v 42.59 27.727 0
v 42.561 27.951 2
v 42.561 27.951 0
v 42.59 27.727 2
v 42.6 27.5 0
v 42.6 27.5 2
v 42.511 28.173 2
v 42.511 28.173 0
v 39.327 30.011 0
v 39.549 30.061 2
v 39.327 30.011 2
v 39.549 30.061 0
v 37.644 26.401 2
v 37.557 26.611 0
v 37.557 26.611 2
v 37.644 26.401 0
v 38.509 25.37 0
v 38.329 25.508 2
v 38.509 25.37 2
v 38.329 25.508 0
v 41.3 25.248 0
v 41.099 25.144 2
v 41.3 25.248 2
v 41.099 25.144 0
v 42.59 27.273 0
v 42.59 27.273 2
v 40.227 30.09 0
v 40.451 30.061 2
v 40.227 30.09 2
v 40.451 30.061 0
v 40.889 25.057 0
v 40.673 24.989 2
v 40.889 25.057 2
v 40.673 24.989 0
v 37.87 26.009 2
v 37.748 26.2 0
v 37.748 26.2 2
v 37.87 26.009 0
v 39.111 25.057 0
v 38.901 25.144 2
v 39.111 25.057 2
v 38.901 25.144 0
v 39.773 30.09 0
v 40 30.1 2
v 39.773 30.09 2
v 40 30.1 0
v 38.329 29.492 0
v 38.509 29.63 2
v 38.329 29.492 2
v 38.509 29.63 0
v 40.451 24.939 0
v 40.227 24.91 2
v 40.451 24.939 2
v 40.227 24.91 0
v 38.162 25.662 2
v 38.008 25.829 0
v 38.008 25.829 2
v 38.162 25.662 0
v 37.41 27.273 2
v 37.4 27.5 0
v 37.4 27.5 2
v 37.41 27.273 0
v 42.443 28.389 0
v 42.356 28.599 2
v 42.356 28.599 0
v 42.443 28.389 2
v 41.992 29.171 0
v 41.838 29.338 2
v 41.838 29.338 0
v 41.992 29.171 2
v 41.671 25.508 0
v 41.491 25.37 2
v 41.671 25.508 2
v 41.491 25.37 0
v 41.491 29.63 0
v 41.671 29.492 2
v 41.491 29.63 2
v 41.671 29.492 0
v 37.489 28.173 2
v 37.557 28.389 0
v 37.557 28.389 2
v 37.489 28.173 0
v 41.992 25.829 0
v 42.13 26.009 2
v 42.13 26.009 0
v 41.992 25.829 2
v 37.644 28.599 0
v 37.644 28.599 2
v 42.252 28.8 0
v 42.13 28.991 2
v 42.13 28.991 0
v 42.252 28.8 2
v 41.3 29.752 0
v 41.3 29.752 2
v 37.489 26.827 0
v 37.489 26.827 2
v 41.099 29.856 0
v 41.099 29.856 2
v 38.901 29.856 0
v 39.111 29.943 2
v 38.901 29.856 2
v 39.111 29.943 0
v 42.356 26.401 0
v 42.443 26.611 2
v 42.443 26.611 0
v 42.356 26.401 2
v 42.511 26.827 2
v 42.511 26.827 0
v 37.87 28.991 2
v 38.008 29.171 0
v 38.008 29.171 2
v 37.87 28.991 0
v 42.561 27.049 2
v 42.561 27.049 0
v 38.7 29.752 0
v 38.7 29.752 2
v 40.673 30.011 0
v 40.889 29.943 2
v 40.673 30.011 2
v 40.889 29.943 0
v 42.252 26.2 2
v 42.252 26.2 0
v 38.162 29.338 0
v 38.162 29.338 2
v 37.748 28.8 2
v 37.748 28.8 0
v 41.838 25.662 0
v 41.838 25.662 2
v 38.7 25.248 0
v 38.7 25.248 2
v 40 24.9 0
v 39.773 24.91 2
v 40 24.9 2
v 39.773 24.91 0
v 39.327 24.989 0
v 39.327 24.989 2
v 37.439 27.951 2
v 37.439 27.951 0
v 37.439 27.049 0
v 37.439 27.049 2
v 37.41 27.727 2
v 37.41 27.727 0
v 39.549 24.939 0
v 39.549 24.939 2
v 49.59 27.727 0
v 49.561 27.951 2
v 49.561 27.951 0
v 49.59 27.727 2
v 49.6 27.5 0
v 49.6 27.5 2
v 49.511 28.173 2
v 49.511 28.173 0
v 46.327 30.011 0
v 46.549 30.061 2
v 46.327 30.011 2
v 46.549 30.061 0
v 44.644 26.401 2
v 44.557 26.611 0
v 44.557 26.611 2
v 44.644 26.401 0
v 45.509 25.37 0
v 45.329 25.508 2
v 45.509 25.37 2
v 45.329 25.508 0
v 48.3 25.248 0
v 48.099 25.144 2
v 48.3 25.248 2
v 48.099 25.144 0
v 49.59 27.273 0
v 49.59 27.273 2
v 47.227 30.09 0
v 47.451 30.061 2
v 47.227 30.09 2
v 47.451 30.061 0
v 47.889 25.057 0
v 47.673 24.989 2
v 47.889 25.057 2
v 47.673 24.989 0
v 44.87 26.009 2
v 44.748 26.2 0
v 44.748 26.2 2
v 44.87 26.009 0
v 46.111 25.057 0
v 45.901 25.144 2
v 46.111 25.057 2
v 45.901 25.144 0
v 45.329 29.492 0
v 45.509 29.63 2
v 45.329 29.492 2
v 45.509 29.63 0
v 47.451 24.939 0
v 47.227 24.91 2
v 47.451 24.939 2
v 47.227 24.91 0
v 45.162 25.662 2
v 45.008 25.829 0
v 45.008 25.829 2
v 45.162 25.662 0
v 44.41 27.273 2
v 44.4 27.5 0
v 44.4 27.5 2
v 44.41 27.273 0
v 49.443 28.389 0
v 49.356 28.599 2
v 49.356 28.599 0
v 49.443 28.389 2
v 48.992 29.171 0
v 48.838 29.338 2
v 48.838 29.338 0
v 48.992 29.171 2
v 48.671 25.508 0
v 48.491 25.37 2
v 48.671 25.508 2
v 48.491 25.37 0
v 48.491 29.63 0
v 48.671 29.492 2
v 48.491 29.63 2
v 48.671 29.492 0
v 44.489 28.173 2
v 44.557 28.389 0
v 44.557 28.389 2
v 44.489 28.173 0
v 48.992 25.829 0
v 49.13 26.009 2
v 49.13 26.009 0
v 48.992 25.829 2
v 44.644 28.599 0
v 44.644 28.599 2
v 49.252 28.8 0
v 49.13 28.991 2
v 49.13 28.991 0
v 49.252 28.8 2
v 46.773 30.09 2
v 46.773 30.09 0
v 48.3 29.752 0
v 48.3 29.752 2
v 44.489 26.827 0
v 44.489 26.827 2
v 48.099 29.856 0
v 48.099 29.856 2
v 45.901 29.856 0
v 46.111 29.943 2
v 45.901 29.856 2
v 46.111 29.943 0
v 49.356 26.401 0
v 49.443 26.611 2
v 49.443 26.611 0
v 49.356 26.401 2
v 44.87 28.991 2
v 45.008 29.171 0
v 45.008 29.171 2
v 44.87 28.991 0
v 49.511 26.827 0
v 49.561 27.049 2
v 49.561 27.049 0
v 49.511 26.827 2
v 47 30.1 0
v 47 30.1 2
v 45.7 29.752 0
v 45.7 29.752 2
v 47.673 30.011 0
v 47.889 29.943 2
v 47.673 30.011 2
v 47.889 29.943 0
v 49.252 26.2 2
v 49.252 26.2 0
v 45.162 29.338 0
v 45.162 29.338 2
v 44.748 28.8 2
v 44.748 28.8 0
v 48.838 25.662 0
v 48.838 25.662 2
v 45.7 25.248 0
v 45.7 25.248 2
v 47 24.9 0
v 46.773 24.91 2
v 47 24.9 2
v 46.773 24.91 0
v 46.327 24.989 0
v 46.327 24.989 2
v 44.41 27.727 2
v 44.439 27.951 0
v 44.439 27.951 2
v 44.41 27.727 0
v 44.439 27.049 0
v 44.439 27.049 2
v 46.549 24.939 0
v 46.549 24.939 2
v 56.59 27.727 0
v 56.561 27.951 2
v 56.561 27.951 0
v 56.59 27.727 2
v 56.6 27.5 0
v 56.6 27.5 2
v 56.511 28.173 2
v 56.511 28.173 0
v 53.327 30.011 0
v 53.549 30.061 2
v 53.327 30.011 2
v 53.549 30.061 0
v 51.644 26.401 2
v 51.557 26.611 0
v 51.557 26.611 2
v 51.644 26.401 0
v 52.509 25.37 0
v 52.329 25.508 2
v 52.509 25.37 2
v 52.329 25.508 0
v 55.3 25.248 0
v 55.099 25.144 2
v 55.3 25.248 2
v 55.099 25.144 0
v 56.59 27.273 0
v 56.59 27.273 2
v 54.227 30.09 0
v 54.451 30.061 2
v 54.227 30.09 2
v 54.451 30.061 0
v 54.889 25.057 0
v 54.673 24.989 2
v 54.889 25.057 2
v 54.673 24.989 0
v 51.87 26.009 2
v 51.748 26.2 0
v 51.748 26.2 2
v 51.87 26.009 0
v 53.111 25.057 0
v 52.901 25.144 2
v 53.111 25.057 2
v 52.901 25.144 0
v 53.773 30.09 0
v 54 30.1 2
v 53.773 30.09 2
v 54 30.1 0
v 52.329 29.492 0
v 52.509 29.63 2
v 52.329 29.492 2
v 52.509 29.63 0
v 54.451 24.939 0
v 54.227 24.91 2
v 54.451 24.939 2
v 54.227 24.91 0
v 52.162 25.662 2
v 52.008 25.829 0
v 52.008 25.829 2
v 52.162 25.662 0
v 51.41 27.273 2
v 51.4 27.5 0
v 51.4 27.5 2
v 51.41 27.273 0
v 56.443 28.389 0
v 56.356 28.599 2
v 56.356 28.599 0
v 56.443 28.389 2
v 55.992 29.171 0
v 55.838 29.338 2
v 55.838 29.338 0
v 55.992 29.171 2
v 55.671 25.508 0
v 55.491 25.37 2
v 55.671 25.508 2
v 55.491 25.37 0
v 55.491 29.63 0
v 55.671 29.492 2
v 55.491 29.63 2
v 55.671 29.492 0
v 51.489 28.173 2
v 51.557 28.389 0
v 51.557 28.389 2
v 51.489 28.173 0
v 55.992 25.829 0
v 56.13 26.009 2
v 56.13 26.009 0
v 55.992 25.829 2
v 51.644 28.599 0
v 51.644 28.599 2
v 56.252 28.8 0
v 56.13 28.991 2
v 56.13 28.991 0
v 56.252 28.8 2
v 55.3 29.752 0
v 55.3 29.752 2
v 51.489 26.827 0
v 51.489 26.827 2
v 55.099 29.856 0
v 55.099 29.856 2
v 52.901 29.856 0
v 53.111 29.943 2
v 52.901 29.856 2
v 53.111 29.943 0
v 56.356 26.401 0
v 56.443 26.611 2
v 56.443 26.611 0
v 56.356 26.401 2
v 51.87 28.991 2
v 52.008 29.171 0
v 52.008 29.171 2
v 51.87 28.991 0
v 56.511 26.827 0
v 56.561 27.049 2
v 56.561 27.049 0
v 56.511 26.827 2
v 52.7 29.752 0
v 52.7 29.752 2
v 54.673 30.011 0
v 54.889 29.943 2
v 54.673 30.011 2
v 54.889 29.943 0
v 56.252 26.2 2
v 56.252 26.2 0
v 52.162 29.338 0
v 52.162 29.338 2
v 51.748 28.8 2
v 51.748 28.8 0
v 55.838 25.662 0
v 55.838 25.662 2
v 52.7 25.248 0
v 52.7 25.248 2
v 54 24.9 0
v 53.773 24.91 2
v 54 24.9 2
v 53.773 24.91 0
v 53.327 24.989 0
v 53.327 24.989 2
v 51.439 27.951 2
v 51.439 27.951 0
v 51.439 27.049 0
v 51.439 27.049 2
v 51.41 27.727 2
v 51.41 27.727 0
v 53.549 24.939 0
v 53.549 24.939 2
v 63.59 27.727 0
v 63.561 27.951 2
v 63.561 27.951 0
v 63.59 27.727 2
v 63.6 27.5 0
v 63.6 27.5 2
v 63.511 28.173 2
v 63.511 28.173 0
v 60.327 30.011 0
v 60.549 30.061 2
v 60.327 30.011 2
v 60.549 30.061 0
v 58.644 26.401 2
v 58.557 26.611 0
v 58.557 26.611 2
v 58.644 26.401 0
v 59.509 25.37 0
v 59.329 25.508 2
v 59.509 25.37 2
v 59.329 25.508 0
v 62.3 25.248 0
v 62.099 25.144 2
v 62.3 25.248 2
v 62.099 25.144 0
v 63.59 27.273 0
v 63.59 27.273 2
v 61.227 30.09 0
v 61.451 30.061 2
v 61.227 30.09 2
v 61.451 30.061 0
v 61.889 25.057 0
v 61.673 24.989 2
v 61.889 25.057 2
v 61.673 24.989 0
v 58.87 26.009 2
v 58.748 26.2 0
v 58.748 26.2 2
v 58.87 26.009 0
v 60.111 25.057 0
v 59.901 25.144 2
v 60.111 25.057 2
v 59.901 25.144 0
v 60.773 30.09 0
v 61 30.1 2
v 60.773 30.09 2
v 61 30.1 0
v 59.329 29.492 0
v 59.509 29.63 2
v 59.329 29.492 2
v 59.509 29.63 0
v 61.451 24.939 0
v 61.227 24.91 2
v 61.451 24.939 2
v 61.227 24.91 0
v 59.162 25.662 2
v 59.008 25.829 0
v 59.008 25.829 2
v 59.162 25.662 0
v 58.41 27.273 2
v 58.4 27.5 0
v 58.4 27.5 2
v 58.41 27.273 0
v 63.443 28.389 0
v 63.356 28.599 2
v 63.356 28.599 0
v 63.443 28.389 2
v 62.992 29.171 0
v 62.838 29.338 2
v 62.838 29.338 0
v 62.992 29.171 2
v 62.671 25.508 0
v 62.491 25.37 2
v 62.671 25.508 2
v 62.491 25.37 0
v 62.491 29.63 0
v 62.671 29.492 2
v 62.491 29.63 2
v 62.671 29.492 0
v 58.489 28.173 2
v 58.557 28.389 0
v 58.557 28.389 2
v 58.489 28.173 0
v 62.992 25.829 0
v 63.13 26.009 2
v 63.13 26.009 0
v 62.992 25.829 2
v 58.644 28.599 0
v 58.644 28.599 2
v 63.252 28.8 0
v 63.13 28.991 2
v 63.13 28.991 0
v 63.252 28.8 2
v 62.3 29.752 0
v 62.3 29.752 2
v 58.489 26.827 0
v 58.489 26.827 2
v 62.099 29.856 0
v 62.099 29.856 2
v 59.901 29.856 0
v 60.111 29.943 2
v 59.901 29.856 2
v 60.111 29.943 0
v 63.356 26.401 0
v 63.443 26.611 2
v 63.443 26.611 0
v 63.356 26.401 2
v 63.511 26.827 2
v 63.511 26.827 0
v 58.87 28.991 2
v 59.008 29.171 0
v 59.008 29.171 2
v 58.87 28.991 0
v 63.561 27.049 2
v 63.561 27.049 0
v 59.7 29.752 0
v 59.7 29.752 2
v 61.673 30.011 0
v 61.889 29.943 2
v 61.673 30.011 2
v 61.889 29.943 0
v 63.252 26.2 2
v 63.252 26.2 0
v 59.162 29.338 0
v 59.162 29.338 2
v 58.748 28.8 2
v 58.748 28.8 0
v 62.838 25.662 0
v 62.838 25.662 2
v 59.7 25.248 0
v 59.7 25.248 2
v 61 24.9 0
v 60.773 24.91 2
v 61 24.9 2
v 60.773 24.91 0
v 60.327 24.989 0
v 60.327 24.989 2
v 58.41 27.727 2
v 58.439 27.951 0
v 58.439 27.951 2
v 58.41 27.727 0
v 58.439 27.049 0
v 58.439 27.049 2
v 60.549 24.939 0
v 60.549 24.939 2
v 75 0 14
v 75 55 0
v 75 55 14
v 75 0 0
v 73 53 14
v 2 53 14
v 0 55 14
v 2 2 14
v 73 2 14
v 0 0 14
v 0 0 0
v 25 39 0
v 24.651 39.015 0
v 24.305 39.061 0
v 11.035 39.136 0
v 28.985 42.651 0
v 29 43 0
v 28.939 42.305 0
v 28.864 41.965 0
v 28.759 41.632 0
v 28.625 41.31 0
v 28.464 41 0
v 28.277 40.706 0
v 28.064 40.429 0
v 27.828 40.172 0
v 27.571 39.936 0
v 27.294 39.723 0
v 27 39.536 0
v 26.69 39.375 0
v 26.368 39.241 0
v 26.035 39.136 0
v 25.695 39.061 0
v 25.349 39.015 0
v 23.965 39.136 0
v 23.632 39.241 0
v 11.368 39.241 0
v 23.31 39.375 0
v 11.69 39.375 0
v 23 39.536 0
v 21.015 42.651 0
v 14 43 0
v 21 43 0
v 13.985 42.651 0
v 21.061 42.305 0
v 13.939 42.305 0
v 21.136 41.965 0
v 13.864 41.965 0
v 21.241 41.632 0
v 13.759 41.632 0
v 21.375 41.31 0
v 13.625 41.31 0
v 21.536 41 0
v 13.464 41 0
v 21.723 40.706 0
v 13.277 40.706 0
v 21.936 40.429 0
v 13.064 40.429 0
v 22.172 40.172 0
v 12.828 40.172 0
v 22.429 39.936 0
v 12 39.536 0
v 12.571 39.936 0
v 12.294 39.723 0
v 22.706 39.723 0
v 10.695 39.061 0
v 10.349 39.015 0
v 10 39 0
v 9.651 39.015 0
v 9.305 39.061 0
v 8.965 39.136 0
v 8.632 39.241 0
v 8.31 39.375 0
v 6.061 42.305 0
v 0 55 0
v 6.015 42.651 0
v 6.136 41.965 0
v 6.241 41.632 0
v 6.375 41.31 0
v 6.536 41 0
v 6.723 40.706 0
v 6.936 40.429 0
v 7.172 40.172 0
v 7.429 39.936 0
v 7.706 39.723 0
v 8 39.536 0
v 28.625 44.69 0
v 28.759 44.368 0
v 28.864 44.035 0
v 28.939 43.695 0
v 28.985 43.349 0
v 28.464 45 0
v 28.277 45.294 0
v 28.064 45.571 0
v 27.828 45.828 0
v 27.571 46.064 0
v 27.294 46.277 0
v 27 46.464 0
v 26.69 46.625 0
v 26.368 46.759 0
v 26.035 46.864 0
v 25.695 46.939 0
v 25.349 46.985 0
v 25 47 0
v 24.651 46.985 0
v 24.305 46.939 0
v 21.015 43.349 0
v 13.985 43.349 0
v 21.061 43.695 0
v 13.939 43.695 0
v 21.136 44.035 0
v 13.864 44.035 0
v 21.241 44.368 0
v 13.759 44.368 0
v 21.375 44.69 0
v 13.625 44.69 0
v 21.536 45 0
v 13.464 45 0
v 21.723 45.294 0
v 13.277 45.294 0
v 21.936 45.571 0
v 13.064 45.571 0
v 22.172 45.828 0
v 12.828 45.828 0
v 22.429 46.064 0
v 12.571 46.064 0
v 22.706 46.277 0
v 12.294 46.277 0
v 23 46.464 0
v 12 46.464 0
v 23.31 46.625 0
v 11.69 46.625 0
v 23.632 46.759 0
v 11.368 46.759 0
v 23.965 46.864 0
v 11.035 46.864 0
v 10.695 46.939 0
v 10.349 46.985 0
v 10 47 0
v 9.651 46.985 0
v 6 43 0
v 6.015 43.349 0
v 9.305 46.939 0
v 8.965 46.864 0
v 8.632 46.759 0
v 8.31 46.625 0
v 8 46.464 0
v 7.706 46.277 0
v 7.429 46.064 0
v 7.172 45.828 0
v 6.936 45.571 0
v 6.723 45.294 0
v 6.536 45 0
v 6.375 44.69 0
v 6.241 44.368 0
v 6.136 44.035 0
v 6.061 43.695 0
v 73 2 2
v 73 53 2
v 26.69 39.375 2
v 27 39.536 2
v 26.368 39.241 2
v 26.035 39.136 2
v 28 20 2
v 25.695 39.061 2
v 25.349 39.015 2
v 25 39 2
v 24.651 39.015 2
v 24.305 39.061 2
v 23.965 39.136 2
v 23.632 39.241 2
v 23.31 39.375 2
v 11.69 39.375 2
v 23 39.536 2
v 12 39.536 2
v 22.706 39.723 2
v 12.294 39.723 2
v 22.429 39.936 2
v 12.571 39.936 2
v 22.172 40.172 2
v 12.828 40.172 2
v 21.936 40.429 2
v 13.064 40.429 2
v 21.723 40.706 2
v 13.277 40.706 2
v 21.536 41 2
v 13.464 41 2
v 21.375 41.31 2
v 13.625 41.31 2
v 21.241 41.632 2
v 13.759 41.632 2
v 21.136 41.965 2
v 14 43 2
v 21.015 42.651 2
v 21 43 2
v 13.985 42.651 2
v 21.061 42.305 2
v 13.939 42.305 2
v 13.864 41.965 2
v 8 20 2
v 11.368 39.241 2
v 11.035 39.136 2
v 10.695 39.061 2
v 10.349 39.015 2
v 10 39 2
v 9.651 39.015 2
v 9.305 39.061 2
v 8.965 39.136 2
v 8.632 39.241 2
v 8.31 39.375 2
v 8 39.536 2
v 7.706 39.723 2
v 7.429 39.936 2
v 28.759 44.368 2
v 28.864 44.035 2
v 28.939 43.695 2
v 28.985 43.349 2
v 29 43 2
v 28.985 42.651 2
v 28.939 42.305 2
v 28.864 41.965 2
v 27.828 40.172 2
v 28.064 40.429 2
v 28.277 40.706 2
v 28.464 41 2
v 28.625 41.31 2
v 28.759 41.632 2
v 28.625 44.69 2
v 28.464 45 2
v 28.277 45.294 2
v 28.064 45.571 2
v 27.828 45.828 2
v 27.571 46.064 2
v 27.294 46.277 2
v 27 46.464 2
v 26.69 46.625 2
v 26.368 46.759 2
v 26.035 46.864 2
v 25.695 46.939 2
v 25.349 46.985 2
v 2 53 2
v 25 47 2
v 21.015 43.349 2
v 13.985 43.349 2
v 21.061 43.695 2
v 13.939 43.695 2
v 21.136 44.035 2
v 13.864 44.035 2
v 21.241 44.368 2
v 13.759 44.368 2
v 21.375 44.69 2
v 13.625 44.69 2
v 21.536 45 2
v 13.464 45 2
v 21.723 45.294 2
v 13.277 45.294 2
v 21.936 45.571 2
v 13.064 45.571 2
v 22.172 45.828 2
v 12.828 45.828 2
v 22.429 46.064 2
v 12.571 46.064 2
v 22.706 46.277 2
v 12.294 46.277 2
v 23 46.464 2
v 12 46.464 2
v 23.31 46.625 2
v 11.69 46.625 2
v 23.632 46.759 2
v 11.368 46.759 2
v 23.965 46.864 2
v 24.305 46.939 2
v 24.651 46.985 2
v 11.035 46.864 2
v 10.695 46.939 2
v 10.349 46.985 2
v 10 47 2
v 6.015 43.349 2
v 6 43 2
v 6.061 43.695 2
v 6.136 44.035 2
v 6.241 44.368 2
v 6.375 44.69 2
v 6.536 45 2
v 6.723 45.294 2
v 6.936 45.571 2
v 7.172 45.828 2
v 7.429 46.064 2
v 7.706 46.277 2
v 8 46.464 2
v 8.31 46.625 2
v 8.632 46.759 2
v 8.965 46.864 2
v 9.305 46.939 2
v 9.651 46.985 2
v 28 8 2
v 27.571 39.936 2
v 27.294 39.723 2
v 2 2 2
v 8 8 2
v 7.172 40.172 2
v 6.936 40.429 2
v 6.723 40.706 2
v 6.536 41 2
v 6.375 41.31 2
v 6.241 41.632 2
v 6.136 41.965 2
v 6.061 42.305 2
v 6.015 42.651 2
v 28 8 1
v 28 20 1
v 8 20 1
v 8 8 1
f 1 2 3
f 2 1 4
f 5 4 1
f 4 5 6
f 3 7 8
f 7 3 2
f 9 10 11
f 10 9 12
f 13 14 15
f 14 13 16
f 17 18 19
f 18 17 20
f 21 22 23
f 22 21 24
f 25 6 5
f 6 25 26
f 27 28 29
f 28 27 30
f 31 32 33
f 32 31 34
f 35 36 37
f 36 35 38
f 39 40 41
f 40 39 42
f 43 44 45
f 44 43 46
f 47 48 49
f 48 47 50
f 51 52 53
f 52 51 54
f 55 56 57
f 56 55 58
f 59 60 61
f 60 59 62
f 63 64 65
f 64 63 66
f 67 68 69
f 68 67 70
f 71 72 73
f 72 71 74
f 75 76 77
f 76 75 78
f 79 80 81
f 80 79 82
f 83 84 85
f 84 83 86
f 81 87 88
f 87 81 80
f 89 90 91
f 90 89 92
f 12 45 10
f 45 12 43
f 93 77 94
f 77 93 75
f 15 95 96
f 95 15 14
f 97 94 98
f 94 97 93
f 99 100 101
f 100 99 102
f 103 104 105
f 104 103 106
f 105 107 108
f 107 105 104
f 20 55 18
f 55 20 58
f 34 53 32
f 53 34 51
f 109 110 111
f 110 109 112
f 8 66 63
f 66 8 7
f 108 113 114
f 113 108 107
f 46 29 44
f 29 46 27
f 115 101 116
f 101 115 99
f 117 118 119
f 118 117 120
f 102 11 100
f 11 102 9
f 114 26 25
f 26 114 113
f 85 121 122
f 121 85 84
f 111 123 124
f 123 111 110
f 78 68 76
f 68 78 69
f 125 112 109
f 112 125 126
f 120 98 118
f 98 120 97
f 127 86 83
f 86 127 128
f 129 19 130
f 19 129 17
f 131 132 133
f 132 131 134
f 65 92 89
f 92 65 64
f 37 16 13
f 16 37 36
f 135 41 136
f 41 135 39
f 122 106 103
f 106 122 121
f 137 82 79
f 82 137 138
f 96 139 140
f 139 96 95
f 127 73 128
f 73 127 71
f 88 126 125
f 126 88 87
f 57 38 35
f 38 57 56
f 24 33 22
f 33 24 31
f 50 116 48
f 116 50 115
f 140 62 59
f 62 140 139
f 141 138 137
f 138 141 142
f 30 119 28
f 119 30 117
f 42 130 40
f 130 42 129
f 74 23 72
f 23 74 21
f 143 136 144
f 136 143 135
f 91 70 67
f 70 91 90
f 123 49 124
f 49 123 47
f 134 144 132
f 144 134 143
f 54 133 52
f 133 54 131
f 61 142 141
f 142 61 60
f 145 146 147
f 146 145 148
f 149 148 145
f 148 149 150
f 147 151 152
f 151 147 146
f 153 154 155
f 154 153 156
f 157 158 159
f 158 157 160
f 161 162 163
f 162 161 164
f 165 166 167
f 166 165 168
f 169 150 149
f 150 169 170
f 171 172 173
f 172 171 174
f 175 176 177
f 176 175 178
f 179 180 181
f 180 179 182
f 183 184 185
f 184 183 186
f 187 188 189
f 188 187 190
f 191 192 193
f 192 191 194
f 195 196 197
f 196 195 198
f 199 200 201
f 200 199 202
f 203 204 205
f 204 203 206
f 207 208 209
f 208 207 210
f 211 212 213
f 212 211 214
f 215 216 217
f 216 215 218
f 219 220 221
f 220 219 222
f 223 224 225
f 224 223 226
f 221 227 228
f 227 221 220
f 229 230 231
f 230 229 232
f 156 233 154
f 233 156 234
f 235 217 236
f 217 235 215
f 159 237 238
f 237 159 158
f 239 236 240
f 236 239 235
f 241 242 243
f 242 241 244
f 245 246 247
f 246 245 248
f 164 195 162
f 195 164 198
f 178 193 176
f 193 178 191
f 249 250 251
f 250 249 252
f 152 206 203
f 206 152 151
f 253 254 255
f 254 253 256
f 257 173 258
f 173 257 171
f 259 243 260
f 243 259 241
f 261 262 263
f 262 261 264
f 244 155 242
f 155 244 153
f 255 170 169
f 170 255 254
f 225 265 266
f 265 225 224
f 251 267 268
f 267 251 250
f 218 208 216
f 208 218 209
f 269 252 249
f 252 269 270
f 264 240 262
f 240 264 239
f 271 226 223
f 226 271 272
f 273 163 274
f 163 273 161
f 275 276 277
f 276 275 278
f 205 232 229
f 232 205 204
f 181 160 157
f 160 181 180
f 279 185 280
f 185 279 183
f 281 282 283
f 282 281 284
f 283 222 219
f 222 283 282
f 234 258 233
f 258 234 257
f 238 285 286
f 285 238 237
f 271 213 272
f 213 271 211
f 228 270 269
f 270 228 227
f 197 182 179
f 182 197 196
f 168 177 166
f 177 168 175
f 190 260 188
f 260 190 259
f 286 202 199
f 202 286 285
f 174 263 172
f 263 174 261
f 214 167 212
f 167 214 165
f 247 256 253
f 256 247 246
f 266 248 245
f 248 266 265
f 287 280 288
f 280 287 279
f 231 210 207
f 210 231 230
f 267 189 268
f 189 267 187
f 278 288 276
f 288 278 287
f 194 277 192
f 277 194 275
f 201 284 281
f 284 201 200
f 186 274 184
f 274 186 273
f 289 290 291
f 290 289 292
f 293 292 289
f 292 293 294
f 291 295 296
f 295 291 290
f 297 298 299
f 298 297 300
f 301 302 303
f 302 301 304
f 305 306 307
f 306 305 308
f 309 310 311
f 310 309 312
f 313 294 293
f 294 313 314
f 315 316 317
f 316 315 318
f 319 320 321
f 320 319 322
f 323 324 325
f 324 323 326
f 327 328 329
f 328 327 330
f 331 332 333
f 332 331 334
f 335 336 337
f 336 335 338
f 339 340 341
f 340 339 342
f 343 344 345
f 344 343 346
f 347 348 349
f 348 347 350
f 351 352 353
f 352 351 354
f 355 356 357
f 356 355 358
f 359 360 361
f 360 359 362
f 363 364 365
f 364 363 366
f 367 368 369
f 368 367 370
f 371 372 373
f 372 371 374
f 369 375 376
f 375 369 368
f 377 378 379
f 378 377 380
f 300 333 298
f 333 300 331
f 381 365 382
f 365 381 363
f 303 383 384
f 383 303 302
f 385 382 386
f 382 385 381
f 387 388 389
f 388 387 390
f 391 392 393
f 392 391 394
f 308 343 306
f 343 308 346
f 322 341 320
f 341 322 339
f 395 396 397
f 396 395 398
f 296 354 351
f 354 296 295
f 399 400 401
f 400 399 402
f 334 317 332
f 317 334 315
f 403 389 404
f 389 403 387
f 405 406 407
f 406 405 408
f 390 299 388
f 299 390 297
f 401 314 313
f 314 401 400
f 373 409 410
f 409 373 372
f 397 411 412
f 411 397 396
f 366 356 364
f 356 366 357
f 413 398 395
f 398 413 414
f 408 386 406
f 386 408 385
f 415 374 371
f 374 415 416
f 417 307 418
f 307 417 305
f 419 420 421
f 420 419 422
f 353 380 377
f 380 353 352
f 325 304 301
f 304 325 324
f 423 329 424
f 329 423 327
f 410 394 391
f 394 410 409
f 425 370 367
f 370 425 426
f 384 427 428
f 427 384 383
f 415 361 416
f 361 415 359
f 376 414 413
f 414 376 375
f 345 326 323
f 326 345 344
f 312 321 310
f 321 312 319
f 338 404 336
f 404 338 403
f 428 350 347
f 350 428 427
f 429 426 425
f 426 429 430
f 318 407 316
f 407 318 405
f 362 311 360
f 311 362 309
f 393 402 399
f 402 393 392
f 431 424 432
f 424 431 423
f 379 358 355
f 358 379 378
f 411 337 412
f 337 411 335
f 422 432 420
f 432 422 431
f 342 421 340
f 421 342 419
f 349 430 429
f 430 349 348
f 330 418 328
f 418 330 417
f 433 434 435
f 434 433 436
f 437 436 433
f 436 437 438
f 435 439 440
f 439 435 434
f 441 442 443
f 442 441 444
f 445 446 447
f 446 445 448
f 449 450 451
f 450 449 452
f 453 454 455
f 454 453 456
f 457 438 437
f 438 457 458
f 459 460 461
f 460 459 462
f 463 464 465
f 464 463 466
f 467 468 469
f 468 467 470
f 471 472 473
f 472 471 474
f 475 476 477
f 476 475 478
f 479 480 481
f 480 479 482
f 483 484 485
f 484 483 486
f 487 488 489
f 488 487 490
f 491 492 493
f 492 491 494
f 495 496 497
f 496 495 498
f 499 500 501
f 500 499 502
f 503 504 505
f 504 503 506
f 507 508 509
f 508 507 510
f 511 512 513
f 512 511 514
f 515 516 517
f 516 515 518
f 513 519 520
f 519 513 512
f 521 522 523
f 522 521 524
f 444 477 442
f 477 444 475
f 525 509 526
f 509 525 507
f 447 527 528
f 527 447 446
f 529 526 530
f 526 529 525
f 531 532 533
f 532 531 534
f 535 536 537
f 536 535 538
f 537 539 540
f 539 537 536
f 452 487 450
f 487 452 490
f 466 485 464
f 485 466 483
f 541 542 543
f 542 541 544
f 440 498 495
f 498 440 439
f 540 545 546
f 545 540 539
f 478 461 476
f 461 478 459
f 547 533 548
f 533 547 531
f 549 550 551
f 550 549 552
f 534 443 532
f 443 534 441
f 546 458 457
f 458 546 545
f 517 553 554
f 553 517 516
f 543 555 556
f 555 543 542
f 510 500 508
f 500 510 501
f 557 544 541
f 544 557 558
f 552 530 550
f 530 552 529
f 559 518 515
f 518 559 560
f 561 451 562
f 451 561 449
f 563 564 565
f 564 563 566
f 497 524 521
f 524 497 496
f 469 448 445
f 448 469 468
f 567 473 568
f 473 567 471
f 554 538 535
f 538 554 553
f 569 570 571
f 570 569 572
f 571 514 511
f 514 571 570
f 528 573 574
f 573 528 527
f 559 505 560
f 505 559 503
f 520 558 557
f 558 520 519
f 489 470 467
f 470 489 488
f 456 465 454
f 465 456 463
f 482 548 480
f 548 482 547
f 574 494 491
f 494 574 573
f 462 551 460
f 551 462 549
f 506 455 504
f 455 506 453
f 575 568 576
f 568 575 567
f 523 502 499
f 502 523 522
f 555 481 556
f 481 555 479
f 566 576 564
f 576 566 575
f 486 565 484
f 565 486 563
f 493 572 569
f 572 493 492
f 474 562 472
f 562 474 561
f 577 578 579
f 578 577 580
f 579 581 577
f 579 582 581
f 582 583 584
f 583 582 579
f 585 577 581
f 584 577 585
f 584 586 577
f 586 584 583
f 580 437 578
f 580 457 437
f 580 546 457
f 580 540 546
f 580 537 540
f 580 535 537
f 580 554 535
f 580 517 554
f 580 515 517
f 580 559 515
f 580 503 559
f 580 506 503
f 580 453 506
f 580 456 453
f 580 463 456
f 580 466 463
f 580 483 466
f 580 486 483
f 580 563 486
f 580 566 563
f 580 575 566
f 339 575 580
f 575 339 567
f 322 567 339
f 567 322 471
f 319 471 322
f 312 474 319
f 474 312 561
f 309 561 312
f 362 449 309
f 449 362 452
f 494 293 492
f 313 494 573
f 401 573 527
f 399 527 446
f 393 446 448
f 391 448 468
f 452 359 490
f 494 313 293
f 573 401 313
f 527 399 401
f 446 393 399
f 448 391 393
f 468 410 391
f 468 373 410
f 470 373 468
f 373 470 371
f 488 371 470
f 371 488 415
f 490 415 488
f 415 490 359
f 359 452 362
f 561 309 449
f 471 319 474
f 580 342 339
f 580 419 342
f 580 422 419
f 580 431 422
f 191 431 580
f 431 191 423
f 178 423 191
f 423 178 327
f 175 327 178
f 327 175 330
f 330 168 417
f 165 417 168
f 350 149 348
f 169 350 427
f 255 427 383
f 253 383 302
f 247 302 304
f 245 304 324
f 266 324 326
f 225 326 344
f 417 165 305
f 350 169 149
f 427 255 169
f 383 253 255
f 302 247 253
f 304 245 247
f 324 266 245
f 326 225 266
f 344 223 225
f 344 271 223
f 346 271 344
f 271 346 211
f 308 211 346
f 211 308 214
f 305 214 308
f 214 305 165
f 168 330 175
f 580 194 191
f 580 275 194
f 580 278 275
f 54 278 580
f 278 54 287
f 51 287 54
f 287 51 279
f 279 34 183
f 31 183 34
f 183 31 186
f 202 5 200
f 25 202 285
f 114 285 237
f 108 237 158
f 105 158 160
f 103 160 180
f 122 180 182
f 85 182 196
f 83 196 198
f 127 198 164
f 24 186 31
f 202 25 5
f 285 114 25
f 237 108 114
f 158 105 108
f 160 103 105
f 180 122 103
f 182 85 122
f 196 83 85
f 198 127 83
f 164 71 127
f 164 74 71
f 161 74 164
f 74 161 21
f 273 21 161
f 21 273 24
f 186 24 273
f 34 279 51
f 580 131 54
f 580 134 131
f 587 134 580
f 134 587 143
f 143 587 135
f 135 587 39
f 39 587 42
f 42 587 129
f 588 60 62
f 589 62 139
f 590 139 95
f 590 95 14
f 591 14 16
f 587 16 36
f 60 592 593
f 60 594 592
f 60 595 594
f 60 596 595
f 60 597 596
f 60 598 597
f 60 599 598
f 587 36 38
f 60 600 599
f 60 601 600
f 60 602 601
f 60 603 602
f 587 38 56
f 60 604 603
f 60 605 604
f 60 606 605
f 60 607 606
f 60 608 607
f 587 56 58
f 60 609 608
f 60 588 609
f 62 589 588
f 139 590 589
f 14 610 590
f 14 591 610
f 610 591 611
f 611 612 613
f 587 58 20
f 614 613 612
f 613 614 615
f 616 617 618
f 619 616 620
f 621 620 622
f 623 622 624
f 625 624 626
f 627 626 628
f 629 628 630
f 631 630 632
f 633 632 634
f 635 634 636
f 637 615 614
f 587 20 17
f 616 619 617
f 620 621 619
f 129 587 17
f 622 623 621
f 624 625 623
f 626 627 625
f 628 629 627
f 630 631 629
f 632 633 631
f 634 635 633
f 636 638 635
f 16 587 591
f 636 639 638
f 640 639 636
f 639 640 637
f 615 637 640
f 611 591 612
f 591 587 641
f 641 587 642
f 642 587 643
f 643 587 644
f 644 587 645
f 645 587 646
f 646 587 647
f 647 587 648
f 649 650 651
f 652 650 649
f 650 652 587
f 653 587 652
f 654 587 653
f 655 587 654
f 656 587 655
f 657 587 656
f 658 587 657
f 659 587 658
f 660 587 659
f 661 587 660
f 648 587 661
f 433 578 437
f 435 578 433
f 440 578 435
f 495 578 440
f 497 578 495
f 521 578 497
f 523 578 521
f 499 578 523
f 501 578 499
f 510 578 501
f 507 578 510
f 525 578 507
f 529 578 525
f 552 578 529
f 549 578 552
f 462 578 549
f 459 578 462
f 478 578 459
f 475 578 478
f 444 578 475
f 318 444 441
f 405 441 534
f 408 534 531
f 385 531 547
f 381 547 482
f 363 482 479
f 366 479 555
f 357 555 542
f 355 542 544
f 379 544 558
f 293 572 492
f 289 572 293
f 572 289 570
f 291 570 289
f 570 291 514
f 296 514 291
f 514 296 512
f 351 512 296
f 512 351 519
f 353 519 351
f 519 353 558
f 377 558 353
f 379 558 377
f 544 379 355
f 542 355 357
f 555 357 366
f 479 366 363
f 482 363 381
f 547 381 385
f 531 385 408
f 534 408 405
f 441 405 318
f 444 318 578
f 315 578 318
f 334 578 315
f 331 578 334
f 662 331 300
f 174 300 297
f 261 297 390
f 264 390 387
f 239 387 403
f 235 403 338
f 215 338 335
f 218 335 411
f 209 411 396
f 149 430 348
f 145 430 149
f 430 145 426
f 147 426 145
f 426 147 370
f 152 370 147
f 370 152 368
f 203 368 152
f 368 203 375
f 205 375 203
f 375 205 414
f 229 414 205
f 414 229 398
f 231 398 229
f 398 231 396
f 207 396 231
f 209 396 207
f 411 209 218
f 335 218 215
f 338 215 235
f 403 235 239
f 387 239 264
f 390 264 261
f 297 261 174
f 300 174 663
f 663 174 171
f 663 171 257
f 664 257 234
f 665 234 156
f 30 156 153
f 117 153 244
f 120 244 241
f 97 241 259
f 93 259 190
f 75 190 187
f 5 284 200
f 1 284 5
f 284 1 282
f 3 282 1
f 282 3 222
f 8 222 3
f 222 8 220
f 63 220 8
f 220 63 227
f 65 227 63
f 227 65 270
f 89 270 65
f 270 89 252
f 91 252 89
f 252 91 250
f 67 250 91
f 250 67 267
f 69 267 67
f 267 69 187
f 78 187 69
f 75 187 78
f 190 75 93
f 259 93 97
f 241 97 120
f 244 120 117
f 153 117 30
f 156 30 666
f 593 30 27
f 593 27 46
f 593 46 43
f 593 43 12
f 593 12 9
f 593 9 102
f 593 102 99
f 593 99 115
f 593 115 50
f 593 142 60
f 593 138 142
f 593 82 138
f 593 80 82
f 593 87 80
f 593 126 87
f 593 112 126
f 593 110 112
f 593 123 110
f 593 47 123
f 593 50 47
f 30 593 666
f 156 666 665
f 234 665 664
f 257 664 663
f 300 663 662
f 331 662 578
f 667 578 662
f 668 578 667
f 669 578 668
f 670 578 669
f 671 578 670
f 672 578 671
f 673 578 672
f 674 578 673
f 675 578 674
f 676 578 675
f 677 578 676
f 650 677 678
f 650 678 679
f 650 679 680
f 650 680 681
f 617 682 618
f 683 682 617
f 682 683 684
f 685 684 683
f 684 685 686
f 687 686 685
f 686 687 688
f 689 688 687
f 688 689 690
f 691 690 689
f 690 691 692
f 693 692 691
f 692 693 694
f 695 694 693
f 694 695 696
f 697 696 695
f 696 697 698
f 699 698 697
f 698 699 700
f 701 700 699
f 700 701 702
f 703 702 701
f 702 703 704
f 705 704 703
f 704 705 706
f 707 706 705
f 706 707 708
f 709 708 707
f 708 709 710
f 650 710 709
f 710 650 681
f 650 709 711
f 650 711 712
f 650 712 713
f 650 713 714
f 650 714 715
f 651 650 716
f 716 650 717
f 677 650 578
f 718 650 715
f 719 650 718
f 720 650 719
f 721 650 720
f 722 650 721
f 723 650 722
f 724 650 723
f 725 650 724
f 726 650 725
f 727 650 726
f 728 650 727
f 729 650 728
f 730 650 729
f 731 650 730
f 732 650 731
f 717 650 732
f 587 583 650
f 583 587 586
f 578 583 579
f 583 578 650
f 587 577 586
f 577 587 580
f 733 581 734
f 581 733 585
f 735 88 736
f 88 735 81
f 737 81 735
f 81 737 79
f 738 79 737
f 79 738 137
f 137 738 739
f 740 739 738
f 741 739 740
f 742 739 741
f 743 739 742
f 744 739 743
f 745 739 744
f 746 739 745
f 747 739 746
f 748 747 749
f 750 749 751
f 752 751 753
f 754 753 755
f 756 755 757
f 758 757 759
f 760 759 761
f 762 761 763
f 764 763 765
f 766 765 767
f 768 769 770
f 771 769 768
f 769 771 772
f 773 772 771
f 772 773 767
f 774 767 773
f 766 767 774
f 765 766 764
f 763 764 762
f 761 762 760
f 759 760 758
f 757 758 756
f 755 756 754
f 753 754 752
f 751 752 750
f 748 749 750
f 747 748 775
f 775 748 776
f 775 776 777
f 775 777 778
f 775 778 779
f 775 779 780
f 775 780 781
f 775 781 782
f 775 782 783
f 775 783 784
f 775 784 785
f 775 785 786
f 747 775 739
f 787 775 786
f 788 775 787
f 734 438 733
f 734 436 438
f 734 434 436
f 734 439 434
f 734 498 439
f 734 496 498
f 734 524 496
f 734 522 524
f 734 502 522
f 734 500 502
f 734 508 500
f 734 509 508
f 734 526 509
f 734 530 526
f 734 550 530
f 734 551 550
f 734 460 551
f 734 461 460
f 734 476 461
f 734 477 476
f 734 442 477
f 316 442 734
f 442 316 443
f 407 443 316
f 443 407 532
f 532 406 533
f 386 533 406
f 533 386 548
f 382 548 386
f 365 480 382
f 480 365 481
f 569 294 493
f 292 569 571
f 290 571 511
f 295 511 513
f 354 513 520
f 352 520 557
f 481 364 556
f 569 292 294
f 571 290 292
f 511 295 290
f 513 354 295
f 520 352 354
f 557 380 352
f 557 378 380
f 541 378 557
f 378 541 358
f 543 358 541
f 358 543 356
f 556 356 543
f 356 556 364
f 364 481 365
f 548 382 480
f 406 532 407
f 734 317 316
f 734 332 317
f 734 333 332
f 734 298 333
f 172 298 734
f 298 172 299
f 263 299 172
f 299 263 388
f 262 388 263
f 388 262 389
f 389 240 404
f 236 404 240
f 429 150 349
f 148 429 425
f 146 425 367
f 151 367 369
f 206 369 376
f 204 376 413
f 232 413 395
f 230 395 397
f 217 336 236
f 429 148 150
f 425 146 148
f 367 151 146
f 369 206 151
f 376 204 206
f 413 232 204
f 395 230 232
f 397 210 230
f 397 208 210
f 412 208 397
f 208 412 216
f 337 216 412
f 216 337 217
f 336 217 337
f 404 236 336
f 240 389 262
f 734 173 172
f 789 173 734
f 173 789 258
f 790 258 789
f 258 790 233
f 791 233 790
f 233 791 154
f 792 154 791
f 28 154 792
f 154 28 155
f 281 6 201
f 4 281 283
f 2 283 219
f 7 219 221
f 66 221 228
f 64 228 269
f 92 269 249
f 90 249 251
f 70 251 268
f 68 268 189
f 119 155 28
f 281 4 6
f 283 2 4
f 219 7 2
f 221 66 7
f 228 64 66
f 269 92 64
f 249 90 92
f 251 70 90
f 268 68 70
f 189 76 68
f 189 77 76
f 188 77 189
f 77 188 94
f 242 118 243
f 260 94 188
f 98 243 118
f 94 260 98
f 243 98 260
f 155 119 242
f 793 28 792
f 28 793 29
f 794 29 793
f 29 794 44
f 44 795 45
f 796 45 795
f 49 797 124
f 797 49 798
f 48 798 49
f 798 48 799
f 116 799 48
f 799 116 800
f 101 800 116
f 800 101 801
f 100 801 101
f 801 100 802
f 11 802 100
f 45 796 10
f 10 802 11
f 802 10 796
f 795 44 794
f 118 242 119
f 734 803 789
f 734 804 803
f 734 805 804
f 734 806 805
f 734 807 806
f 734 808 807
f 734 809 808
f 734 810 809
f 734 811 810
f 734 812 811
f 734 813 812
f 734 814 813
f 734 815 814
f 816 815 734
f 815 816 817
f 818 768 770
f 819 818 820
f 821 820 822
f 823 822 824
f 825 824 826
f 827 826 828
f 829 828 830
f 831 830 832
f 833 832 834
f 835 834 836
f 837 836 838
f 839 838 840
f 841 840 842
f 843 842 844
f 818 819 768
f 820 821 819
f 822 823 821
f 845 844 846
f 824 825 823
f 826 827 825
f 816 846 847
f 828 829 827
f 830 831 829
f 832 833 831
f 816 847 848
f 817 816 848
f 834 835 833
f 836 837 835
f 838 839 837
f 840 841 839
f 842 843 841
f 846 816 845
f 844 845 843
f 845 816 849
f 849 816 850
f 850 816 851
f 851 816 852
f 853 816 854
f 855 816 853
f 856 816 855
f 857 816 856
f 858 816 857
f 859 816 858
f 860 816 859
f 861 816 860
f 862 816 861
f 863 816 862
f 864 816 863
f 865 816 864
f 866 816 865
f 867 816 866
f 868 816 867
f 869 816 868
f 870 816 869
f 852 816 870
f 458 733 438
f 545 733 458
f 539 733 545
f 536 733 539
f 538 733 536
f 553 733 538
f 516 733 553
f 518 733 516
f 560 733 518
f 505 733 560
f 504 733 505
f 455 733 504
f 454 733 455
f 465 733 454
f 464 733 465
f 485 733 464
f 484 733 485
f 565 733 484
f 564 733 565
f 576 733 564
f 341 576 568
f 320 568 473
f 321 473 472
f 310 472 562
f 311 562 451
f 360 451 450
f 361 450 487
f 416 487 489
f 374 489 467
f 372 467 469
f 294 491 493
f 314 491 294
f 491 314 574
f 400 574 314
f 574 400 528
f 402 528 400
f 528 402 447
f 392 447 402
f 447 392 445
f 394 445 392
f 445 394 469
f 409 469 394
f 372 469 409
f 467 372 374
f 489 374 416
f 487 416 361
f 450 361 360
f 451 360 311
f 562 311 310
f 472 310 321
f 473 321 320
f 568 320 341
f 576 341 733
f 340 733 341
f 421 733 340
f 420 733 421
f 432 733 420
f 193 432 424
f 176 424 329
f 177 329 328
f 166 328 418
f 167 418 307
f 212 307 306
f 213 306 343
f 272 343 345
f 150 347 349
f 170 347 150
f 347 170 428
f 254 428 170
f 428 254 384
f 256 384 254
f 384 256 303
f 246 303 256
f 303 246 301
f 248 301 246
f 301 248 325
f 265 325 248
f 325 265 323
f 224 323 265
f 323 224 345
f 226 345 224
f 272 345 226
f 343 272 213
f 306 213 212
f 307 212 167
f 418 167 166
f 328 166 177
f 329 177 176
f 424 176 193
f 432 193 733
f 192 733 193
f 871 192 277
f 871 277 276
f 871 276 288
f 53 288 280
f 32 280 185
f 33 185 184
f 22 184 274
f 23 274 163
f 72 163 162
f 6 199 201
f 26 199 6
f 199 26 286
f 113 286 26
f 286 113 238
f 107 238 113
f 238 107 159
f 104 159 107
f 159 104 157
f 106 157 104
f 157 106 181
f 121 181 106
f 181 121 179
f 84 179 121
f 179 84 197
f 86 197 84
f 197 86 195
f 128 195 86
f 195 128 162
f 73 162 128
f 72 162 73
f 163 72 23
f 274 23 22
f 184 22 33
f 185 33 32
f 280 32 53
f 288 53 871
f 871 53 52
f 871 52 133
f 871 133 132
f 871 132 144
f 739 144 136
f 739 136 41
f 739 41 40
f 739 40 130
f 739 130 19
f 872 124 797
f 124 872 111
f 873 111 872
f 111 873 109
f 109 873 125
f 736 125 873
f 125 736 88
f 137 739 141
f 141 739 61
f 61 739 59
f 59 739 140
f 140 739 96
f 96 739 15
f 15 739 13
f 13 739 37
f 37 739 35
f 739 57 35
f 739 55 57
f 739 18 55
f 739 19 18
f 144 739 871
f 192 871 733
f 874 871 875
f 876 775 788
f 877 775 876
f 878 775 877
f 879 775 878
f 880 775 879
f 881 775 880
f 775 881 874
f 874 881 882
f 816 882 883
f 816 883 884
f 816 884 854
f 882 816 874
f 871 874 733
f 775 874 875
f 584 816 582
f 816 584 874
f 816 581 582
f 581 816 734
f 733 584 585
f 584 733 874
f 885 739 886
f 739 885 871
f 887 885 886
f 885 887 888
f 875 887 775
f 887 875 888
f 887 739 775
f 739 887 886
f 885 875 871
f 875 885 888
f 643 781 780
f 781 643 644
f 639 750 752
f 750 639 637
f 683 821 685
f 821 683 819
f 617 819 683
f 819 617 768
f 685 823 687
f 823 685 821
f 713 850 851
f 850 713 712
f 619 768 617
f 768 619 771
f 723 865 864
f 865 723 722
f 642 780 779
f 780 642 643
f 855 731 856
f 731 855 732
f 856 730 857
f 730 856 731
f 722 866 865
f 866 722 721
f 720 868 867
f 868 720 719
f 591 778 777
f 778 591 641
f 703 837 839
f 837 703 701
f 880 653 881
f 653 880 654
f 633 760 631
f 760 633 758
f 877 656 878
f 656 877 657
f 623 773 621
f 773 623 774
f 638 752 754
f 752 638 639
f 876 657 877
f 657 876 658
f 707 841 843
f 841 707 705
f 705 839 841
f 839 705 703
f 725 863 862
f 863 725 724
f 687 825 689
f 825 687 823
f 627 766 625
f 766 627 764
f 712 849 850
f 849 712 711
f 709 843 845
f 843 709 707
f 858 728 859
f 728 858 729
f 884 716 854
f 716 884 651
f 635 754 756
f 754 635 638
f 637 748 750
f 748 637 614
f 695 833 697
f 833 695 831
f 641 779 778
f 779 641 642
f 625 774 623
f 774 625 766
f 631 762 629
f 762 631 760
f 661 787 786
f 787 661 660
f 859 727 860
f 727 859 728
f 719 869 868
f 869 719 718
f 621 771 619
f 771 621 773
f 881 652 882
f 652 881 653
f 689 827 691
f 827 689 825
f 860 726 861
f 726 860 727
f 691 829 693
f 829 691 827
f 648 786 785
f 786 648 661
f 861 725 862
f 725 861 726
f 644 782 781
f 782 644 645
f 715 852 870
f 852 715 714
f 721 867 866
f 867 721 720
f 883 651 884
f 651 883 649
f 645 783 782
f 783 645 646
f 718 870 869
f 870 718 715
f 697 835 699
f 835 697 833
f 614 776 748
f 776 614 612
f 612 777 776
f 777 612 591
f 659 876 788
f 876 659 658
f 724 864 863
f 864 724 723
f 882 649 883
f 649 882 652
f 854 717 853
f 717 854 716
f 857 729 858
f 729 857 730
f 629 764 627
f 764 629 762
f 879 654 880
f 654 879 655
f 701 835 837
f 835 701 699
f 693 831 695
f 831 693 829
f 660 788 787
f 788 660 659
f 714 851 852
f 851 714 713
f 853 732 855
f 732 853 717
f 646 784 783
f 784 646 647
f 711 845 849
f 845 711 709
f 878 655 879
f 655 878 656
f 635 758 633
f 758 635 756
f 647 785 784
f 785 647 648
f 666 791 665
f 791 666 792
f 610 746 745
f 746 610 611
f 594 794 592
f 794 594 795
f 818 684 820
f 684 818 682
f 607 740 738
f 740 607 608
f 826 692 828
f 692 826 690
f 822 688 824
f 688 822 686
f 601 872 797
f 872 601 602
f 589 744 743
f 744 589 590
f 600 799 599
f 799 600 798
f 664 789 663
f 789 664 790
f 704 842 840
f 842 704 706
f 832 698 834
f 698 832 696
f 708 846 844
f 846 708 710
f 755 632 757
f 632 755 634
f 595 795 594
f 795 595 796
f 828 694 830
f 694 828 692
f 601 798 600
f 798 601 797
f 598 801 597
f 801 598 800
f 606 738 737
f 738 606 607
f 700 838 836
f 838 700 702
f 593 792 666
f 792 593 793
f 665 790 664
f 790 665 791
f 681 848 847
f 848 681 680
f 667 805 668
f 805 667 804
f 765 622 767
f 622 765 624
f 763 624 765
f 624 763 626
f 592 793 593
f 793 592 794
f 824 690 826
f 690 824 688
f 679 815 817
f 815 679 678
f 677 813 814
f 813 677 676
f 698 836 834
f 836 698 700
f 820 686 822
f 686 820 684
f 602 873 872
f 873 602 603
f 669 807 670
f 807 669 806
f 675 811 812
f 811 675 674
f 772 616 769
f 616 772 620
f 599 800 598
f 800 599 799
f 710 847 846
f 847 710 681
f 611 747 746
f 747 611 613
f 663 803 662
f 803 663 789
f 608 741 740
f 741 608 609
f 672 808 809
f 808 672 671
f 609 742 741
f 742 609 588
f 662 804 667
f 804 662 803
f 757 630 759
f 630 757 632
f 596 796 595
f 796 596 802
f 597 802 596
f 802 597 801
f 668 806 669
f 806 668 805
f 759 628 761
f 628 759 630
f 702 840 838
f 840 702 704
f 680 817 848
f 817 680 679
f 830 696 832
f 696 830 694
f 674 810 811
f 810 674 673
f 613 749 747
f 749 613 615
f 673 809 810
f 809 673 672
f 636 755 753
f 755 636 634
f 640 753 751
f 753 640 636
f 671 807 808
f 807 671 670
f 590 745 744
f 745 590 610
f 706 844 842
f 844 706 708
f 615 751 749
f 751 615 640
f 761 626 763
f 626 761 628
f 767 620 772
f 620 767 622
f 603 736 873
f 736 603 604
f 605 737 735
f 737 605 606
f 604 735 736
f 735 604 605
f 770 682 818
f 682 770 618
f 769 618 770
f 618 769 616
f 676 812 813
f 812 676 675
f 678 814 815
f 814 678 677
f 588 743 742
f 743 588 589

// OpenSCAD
// file: parameters.scad
// AFPM-Desk-v2 shared parameters (mm)
// Dual-rotor axial-flux PM learning generator with steel back-iron.
// Faraday induction education only — not free-energy / overunity.
// Target printer: Anycubic Kobra 3 Max, 0.4 mm nozzle, 0.2 mm layers, PLA/PETG.

$fn = 72;

// --- Printer / FDM assumptions ---
nozzle = 0.4;
layer = 0.2;
wall = 1.6;                 // load-bearing walls ~4 perimeters
housing_wall = 2.4;
clearance_slip = 0.35;      // shaft slip fit
clearance_loose = 0.55;
press_interference = 0.15;  // bearing pocket undersize total (coupon-test)
magnet_pocket_xy = 0.25;    // +0.25 mm on diameter
magnet_pocket_z = 0.15;     // +0.15 mm depth
elephant_foot = 0.5;

// --- Magnets (N42 Neo discs) ---
magnet_d = 20;
magnet_h = 3;
magnet_count = 8;           // per rotor (8+8 total)
magnet_pcd = 70;

// --- Steel back-iron (purchased mild steel disc) ---
steel_od = 100;
steel_id = 14;              // clearance around hub boss
steel_h = 1.5;              // 1.5–2.0 mm mild steel OK
steel_recess_clearance = 0.3;

// --- Rotor printed disc ---
rotor_od = 110;
rotor_hub_bore = 12;        // seats on shaft_hub boss
rotor_thickness = 7;        // magnet pocket from face; steel recess on back
magnet_pocket_depth = magnet_h + magnet_pocket_z;
steel_recess_depth = steel_h + 0.2;

// --- Stator (coreless, between rotors) ---
stator_od = 120;
stator_id = 28;
stator_thickness = 10;
coil_count = 6;
coil_slot_w = 24;
coil_slot_l = 30;           // radial length of pocket
coil_slot_depth = 8;
coil_pcd = 70;
stator_pillar_pcd = 100;    // M4 pillar holes

// --- Coil former / bobbin ---
former_core_w = 14;
former_core_l = 26;
former_flange = 3;
former_wind_h = 11;
former_bore = 0;            // solid core, split design via kerf

// --- Shaft / bearings ---
shaft_d = 8;
bearing_od = 22;            // 608-2RS
bearing_id = 8;
bearing_h = 7;
bearing_seat_od = bearing_od - press_interference; // coupon-test; start ~21.85

// --- Base / frame ---
base_w = 180;
base_d = 160;
base_h = 8;
post_h = 70;
post_spacing = 120;         // Y distance between bearing post centers
post_d = 36;

// --- Axial stack targets (along shaft / Y) ---
// crank | brg | hub+rotorA+steel | air | stator | air | steel+rotorB+hub | brg
air_gap_nominal = 2.0;      // mechanical per side magnet↔coil face

// --- Crank ---
crank_arm_len = 85;
crank_arm_w = 18;
crank_arm_t = 10;
handle_d = 14;
handle_len = 45;

// --- Electronics tray ---
tray_w = 75;
tray_d = 55;
tray_h = 14;

// --- Fasteners ---
m3_clear = 3.4;
m3_tap = 2.5;
m4_clear = 4.3;
// main file
include <parameters.scad>

module electronics_tray() {
  difference() {
    cube([tray_w, tray_d, tray_h]);
    translate([2,2,2])
      cube([tray_w-4, tray_d-4, tray_h]);
    // rectifier pocket
    translate([8, 8, 1])
      cube([20, 12, 4]);
    // LED holes
    for (i = [0:3]) {
      translate([40 + i*7, tray_d/2, -0.1])
        cylinder(h=3, d=5.2);
    }
    // banana jack holes
    translate([10, tray_d - 12, -0.1]) cylinder(h=3, d=8);
    translate([25, tray_d - 12, -0.1]) cylinder(h=3, d=8);
  }
}

electronics_tray();
